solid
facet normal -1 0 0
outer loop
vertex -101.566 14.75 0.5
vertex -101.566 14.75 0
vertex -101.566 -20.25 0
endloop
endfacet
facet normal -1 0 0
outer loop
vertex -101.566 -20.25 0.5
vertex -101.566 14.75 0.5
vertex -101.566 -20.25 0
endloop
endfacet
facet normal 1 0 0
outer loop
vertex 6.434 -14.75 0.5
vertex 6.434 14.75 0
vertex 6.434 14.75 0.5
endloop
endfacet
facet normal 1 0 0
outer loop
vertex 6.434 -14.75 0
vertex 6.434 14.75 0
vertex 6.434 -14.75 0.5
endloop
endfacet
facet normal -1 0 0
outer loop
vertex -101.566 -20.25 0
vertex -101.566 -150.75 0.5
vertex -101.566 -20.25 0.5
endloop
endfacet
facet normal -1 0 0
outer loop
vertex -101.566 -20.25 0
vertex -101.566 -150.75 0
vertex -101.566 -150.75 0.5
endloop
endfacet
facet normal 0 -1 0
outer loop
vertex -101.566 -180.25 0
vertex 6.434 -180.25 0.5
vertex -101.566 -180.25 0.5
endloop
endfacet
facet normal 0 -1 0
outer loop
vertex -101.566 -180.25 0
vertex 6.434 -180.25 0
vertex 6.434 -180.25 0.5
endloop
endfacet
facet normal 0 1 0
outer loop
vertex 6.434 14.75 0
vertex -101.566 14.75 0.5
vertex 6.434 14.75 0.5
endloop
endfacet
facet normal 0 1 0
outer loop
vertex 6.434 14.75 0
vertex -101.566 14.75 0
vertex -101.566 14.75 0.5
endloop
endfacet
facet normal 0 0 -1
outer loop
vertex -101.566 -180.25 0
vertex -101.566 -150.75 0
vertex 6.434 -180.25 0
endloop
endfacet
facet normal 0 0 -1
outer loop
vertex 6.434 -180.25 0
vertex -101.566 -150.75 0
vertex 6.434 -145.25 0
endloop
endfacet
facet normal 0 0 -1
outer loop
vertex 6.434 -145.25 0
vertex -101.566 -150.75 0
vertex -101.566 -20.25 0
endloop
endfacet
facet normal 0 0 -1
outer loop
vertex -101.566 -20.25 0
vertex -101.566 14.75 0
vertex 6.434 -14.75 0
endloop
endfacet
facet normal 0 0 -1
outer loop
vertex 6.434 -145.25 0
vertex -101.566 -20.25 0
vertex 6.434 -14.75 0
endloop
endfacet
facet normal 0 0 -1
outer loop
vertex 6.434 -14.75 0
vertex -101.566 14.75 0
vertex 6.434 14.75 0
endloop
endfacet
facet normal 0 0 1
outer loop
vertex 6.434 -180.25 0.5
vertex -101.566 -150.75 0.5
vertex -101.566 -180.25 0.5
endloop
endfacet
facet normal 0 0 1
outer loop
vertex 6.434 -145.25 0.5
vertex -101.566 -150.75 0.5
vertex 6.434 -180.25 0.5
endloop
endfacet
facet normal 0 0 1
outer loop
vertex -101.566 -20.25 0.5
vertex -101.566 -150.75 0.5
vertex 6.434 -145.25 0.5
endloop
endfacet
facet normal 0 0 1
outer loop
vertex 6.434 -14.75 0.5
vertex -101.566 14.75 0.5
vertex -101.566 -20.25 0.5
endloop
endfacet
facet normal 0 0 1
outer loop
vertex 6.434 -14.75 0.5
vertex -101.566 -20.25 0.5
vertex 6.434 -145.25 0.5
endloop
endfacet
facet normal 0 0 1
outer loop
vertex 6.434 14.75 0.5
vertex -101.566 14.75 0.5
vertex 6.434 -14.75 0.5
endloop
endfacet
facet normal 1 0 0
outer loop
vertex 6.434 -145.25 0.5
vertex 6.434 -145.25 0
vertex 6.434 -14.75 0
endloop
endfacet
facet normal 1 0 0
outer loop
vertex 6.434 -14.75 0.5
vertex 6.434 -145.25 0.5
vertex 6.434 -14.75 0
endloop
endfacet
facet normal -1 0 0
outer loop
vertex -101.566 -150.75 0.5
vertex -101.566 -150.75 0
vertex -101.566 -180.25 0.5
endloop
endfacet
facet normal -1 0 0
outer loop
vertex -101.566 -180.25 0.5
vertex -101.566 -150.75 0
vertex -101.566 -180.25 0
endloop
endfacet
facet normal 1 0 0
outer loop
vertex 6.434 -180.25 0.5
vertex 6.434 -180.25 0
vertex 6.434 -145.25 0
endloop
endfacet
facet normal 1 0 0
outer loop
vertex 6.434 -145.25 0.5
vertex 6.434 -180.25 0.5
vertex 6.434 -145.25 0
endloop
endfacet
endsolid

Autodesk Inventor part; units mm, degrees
ref_plane "YZ Plane" through (0, 0, 0) normal (1, 0, 0) x (0, 1, 0)
ref_plane "XZ Plane" through (0, 0, 0) normal (0, 1, 0) x (-1, 0, 0)
ref_plane "Work Plane1" through (0, 0, 0) normal (0, 0, 1) x (1, 0, 0)
sketch "Sketch1" plane through (0, 0, 0) normal (0, 0, 1) x (1, 0, 0)
  line L0 (6.4345, -180.25) -> (6.4345, -145.25) projected
  line L1 (6.4345, 14.75) -> (6.4345, -14.75) projected
  line L2 (-101.5655, -150.75) -> (-101.5655, -180.25) projected
  line L3 (-101.5655, 14.75) -> (-101.5655, -20.25) projected
  line L4 (6.4345, -180.25) -> (-101.5655, -180.25)
  line L5 (-101.5655, 14.75) -> (6.4345, 14.75)
  line L6 (-101.5655, -150.75) -> (-101.5655, -20.25)
  line L7 (6.4345, -145.25) -> (6.4345, -14.75)
  point P0 (0, 0)
extrude "Extrusion1" add sketch "Sketch1" along normal blind 0.5
properties part number "Bandeja recolectora"
